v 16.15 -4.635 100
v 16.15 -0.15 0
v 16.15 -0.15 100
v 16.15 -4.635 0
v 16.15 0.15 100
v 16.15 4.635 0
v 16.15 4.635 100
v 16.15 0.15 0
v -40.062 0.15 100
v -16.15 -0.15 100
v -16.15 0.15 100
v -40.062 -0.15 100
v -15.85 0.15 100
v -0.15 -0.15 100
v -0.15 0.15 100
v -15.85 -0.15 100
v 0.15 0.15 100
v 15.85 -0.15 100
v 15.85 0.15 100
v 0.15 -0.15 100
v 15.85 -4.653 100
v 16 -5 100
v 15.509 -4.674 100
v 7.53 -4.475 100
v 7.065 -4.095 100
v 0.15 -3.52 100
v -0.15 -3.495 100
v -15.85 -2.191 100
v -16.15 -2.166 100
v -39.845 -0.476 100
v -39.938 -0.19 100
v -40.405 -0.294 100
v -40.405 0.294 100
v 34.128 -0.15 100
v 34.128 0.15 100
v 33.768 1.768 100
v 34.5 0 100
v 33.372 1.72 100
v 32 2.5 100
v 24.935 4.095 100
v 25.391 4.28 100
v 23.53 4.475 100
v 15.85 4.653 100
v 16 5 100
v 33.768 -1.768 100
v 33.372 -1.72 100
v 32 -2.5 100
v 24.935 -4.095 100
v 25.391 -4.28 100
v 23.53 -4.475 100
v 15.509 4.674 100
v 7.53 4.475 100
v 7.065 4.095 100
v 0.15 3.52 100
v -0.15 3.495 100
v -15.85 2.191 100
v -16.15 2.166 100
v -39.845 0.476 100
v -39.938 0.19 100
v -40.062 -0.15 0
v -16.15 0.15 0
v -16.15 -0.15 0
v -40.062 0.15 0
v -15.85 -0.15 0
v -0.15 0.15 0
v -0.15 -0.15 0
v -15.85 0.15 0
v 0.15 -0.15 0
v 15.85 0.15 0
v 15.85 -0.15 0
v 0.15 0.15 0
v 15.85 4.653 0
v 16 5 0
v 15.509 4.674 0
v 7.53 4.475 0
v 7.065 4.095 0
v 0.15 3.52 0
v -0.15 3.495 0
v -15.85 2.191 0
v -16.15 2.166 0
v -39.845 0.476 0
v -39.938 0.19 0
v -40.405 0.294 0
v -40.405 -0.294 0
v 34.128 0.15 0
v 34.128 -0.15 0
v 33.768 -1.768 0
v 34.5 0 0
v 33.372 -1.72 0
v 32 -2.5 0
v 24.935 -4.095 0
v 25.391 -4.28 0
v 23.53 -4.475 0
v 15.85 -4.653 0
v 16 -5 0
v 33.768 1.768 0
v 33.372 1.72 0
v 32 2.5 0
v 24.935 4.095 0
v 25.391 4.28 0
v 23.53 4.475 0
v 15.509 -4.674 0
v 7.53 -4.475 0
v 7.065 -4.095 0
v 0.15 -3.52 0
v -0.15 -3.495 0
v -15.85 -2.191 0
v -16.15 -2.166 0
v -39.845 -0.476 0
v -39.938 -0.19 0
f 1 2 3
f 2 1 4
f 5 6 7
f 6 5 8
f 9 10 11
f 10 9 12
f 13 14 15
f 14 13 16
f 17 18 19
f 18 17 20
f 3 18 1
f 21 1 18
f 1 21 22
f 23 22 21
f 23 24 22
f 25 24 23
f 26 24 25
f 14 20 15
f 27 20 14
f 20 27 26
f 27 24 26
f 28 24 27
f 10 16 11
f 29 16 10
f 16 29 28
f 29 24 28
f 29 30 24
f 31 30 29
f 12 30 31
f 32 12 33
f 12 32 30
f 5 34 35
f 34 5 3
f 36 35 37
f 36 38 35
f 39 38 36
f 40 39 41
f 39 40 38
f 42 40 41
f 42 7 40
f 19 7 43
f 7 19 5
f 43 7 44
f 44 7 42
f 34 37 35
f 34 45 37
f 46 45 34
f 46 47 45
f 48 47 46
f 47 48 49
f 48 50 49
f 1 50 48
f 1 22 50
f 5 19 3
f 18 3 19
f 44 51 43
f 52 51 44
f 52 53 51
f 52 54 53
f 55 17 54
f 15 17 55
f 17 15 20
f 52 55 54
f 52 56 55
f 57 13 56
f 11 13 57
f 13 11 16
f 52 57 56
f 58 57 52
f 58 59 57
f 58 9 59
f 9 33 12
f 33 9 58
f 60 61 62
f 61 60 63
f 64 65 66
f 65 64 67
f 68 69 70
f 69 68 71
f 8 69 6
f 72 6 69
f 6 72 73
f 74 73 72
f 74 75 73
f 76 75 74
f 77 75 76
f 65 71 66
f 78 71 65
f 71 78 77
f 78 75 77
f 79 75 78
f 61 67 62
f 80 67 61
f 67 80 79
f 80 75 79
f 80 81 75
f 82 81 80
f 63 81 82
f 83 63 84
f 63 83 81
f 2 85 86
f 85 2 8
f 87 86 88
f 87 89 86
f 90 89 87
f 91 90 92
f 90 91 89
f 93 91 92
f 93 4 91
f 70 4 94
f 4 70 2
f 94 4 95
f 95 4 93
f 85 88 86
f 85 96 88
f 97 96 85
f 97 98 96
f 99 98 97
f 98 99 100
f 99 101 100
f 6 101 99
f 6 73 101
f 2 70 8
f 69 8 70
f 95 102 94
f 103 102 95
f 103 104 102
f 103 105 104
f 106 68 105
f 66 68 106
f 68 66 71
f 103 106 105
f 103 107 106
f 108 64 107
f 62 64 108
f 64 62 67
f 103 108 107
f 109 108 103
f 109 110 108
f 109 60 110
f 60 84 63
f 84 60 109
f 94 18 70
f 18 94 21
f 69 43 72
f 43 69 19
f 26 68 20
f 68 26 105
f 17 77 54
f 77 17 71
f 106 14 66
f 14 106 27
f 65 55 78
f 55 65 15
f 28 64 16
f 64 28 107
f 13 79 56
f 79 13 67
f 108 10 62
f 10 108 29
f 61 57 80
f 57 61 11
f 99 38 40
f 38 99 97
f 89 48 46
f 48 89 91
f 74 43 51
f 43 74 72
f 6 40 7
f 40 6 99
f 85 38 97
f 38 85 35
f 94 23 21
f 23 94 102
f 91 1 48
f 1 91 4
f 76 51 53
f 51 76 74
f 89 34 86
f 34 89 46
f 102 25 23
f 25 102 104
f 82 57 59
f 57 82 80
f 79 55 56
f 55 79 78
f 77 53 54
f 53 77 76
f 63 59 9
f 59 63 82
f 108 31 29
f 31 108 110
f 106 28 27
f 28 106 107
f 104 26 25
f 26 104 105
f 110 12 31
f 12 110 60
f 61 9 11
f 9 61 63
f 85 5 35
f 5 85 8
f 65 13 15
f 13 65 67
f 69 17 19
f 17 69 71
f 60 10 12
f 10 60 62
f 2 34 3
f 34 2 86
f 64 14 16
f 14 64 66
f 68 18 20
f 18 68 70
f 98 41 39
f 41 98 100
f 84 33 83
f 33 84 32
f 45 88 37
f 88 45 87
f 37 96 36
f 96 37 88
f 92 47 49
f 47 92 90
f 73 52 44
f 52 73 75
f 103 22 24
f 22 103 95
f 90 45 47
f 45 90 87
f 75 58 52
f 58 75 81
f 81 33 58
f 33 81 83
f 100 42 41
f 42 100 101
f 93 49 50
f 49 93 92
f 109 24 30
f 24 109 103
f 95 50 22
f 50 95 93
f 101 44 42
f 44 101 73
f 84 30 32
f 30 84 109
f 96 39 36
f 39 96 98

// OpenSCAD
// Copyright 2013 Peter Withers
// Licensed as GPL 2

module MakeFoil2(span, length, ratio){
	scale([1, ratio, 1])cylinder(h = span, r1 = length, r2 = length, center = true);
	hull() {
	   translate([15,10,0]) circle(10);
	   circle(10);
	}
}

module makeFoilSection1(posY, lengthShift, heightMultiplier){
	hull (){
		translate([lengthShift * posY-1,0,0]) circle(r = posY * heightMultiplier);
		translate([lengthShift * posY+1,0,0]) circle(r = (posY+1) * heightMultiplier);
		}
}
module MakeFoil1(span, length, height){
	lengthShift = length / 10;
	heightMultiplier = height / 1;
	for (posY = [1:10]){
		makeFoilSection1(posY, lengthShift, heightMultiplier);
	}
}
//MakeFoil1(50,30,0.5);

module MakeFoil(span, length, height, wall){
	lengthShift = length / 10;
	linear_extrude(height=span) hull (){
		translate([lengthShift * 0 - length / 2,0,0]) circle(r = height / 2 * 0.1 - wall);
		translate([lengthShift * 6 - length / 2,0,0]) circle(r = height / 2 * 0.9 - wall);
		translate([lengthShift * 7 - length / 2,0,0]) circle(r = height / 2 * 1.0 - wall);
		translate([lengthShift * 8 - length / 2,0,0]) circle(r = height / 2 * 0.9 - wall);
		translate([lengthShift * 9 - length / 2,0,0]) circle(r = height / 2 * 0.5 - wall);
	}
}

// This version makes a foil that is thin walled. In skeinforge 50 at least when this version is printed the tool path is always the same for each layer. As a result most corners have one edge that will probably break or might never have joined when printing
module MakeHollowFoil(span, length, height, wall){
	difference(){
		MakeFoil(span,length,height,0);
		difference(){
			translate([0,0,-5]) MakeFoil(span+10,length,height,wall);
			translate([0,0,span/2])cube([length+10,wall,span], center =true);
			for (strutPos = [length/5,0,-(length/5)]) {
				translate([strutPos,0,span/2])cube([wall,height,span], center =true);
			}
		}
	}
}

// This version failed to print the inner struts on skeinforge 50. 
// This version makes a foil that is solid but sliced so that skeinforge adds peremiters around the internal struts. This should solve the thin walled problem but must be printed with FILL turned off. 
module MakeSlicedFoil(span, length, height, wall){
	difference(){
		MakeFoil(span,length,height,0);
		translate([0,0,span/2])cube([length+10,0.1,span], center =true);
		for (strutPos = [length/5,0,-(length/5)]) {
			translate([strutPos,0,span/2])cube([0.1,height,span], center =true);
		}
	}
}
//MakeSlicedFoil(50,80,10,0.3);
MakeHollowFoil(100,80,10,0.3);
//MakeFoil(50,80,10,0);
